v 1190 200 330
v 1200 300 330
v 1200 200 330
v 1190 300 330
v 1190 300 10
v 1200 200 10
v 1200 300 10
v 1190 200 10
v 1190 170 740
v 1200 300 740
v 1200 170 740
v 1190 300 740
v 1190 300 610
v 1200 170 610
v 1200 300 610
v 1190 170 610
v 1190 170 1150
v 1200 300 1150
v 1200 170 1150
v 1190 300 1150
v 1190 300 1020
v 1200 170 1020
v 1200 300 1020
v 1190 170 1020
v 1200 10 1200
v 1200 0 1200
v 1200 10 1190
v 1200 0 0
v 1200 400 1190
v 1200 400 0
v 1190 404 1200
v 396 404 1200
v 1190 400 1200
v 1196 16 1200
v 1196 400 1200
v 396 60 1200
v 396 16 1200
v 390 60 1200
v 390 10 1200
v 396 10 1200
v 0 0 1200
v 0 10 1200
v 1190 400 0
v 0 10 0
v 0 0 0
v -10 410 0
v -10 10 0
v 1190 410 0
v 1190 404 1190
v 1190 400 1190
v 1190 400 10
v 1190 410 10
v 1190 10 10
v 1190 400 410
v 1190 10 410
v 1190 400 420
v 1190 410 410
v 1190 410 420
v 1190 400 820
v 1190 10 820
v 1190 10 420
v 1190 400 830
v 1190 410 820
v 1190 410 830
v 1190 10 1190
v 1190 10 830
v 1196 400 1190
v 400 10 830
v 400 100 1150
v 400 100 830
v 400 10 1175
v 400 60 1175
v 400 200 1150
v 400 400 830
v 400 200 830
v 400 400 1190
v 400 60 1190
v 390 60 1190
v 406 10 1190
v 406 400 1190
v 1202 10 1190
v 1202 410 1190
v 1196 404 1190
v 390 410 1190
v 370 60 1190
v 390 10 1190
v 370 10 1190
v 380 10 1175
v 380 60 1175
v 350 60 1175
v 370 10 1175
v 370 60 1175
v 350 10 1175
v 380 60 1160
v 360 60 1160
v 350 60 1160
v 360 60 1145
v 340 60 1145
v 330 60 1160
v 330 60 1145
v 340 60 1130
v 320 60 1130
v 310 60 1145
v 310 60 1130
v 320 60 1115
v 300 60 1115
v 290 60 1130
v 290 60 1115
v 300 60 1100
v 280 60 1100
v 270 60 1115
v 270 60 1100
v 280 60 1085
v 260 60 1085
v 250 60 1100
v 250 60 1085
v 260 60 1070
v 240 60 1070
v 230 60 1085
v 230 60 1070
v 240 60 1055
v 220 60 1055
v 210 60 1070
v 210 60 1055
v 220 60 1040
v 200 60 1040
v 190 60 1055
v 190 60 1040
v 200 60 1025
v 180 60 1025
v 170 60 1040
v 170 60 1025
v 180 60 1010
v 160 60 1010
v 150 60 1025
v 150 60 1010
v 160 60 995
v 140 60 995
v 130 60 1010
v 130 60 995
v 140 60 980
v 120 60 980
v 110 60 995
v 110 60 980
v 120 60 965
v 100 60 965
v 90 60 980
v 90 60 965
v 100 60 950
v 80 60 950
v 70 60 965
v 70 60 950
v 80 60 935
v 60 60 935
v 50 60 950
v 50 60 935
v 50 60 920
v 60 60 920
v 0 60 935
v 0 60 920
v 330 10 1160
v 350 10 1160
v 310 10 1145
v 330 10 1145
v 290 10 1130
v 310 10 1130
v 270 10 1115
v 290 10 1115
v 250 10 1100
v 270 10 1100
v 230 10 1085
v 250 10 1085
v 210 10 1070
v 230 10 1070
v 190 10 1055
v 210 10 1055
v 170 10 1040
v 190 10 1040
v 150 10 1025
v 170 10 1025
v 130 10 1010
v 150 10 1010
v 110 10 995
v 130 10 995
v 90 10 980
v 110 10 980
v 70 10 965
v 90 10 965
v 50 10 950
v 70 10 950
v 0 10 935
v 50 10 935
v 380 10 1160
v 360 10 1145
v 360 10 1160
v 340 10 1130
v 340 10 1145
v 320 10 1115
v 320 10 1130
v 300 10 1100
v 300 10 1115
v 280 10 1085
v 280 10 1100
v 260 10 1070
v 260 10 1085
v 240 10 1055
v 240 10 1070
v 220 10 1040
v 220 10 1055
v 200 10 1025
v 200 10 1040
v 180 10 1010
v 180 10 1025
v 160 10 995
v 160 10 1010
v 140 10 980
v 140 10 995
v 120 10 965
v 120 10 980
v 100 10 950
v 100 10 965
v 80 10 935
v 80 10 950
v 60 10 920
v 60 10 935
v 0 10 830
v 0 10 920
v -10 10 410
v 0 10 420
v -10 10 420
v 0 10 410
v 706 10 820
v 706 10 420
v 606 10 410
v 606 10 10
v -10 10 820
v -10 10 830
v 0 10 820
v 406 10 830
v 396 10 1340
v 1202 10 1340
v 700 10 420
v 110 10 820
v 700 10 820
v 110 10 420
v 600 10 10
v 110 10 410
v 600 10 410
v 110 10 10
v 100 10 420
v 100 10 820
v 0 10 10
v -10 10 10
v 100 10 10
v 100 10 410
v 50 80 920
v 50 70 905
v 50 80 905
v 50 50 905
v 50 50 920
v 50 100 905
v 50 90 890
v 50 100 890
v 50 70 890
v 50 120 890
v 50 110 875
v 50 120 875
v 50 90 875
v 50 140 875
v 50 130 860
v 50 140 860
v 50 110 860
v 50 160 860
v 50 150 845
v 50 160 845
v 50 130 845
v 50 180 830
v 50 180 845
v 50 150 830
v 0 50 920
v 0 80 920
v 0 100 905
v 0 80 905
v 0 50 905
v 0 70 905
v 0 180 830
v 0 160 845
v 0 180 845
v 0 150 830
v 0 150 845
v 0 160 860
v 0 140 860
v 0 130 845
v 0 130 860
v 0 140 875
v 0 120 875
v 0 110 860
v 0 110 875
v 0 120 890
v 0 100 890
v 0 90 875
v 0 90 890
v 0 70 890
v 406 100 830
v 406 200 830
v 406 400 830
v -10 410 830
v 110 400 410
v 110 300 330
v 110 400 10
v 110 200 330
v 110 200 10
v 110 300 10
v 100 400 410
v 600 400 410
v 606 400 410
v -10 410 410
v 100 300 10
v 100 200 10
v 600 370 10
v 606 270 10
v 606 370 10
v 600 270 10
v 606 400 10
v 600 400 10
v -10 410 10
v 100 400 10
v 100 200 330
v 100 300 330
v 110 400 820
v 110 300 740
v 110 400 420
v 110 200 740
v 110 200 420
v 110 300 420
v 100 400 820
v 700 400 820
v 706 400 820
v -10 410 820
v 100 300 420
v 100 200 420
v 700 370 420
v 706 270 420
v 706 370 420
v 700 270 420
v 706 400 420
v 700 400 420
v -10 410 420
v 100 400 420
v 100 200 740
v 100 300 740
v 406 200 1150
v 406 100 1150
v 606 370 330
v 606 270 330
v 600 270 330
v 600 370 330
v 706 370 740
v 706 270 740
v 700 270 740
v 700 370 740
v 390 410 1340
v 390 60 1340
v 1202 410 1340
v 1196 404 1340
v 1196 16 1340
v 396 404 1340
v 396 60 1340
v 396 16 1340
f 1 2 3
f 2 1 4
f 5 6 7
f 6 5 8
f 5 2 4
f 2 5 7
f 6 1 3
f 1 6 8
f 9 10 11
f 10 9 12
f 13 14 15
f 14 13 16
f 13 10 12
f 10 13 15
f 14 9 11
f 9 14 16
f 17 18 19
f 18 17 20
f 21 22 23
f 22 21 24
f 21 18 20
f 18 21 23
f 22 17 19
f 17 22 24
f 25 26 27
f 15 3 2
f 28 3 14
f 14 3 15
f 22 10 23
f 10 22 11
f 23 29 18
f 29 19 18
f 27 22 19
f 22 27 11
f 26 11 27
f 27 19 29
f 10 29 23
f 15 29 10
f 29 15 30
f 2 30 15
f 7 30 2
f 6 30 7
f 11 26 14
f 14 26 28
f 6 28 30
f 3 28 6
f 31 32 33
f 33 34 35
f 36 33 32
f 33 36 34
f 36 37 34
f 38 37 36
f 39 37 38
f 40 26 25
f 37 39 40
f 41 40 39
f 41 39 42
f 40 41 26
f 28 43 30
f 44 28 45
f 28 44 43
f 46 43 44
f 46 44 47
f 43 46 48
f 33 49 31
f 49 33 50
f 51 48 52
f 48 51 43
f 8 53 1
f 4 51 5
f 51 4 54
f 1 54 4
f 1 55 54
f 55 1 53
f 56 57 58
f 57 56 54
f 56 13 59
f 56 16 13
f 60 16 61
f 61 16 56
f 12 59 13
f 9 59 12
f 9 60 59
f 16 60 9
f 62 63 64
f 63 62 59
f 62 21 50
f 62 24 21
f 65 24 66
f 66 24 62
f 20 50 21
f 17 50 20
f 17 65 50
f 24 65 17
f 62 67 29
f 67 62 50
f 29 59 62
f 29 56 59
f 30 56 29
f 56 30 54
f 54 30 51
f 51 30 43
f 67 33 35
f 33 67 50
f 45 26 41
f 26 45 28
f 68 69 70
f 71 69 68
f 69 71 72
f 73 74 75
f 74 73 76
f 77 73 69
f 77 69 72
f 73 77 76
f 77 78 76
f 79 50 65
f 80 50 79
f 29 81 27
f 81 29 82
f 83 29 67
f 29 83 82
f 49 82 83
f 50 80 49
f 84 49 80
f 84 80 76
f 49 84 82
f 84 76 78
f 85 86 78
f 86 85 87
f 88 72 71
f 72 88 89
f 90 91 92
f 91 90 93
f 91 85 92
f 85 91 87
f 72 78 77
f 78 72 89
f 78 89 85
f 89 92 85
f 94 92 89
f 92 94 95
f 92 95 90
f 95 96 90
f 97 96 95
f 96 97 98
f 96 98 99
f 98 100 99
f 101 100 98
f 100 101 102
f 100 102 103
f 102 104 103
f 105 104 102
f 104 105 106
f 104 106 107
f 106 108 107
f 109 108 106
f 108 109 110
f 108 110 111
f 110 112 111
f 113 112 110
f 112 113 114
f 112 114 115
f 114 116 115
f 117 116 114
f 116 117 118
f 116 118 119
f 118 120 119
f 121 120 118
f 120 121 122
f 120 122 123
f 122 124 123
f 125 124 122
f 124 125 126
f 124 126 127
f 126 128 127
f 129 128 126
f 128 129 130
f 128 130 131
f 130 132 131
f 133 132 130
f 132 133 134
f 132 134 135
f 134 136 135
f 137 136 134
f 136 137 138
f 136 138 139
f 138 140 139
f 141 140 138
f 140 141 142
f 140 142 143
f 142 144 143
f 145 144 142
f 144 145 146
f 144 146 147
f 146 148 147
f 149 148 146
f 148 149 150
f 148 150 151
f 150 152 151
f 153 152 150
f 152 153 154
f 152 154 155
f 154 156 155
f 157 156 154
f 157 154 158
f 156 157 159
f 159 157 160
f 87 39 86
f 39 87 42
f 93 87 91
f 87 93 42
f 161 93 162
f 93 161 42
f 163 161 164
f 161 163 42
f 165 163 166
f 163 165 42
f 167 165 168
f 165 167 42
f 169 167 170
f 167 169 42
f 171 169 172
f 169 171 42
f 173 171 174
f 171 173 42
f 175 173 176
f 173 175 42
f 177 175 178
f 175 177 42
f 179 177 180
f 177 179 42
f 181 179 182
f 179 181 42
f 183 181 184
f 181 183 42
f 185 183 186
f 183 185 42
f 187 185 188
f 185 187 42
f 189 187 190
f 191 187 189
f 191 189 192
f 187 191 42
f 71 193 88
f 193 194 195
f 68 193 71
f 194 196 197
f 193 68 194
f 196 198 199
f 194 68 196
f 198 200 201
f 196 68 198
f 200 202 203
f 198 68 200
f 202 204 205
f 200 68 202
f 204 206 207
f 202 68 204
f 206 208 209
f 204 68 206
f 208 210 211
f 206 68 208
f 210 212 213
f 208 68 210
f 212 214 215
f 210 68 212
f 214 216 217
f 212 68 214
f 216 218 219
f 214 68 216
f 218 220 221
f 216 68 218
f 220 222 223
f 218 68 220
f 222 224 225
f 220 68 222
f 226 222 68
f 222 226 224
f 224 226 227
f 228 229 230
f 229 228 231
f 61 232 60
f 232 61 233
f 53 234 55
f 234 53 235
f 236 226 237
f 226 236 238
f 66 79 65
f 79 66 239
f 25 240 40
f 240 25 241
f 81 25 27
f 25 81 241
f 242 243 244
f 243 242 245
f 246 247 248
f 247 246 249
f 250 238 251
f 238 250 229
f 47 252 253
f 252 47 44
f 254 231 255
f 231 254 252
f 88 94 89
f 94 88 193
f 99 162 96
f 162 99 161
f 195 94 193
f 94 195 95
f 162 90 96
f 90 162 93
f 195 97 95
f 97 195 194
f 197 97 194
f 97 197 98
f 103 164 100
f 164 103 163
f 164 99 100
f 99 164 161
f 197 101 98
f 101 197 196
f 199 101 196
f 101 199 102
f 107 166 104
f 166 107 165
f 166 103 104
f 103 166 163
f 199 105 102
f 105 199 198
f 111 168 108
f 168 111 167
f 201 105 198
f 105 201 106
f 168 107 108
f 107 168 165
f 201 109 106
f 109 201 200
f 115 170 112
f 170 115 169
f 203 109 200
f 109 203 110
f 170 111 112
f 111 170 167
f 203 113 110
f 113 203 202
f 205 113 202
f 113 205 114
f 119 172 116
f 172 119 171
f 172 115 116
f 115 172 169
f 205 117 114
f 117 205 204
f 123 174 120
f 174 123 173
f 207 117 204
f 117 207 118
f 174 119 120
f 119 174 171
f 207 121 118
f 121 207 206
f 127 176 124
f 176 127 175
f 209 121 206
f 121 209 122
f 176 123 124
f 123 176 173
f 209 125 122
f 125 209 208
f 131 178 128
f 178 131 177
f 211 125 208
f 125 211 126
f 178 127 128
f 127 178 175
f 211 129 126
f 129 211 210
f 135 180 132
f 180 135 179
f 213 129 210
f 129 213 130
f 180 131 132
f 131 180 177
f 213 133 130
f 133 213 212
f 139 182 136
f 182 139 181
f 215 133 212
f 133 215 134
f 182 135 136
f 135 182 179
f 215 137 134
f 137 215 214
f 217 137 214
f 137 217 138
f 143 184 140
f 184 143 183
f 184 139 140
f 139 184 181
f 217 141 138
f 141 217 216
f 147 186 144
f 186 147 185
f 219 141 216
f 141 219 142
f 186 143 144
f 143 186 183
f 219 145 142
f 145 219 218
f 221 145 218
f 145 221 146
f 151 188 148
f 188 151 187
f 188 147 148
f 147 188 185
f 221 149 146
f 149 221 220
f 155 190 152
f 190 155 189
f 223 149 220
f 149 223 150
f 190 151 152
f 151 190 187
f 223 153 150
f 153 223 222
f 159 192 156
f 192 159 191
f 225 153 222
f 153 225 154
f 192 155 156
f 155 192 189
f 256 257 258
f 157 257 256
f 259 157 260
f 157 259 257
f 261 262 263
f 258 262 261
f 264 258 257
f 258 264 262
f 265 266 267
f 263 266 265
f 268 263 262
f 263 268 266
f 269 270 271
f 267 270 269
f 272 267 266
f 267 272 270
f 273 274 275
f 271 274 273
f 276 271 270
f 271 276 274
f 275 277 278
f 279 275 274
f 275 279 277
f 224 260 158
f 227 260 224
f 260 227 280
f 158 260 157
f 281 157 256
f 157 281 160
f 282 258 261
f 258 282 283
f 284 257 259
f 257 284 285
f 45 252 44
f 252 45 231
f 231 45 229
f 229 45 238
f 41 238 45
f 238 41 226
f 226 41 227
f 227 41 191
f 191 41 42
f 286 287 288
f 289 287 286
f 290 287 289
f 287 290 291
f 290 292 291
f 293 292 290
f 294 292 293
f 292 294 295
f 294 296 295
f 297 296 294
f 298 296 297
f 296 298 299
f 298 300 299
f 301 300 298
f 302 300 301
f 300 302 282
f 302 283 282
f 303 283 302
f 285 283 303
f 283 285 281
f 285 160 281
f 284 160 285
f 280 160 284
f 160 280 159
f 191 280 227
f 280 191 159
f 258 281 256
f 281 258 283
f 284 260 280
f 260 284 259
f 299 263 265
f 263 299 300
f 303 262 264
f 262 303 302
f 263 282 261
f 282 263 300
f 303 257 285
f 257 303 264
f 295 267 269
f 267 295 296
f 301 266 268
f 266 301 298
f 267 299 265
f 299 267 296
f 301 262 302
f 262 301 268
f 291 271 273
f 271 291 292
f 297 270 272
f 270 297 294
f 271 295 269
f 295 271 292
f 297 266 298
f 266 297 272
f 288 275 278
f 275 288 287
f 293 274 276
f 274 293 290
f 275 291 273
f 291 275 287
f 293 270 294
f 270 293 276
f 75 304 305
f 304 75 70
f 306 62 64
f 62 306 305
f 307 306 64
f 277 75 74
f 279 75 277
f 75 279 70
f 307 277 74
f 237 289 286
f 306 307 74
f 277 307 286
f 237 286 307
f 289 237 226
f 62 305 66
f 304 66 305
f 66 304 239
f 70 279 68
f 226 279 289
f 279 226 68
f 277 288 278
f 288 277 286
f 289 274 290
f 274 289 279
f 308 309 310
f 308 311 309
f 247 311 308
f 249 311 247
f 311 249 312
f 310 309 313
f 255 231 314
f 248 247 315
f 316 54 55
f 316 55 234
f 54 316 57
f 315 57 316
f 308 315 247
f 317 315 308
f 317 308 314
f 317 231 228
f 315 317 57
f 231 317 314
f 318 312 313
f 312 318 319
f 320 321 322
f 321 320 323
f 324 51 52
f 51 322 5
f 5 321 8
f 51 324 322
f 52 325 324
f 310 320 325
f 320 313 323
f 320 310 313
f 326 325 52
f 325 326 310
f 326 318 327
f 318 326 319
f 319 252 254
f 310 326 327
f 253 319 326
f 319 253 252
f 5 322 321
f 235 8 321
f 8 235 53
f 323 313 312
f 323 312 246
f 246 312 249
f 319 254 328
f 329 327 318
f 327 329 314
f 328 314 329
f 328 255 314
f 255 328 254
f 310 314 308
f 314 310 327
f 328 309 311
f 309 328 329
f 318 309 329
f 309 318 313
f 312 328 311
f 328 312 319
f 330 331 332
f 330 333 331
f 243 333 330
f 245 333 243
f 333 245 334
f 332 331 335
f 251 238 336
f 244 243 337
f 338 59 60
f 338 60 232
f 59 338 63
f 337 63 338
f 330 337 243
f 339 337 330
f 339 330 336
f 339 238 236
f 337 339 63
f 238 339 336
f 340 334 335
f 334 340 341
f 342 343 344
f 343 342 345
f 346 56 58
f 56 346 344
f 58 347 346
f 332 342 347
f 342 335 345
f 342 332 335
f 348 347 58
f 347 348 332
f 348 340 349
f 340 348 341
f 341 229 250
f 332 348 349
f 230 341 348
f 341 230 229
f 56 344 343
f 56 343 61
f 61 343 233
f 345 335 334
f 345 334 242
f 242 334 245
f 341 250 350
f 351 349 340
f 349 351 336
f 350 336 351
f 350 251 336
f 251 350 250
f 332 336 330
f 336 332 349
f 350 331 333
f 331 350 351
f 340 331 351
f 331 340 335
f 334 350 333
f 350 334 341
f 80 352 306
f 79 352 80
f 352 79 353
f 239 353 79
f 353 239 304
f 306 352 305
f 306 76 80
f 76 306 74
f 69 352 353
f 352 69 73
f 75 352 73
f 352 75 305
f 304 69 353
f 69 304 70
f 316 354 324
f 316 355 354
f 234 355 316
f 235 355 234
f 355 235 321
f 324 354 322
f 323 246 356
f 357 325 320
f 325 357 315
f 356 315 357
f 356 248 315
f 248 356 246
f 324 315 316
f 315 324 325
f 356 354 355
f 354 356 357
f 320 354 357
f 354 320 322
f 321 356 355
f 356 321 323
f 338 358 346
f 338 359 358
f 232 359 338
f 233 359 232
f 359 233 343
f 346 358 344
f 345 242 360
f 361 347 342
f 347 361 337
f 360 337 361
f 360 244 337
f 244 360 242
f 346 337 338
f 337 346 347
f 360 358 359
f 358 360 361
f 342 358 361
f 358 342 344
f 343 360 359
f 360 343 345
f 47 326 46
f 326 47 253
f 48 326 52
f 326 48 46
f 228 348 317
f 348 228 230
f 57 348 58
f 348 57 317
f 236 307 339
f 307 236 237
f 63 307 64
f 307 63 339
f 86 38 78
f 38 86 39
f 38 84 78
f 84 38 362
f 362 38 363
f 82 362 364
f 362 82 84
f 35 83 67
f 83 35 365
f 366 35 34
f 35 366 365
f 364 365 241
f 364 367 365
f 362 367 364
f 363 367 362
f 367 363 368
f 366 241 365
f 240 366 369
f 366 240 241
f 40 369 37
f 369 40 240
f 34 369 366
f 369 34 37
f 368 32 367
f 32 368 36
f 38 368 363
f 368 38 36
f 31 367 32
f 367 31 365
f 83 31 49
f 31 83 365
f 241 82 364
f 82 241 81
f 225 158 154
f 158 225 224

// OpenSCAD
module door() {
    cube([30,100,320]);
}

module window() {
    cube([30,130,130]);
}
// Fond 1m20 x 1m20 x 1cm
cube([1200,10,1200]);
// Mur Gauche 1m20 x 40cm x 1cm
// devant le fond
difference() {
    translate([1190,0,0]) {
      cube([10,400,1200]);
    }
    union() {
        // Porte 32cm x 10cm 
        // située à 10cm du devant et à 1cm du sol
        translate([1189,200,10]) door();
        // Fenêtre
        translate([1189,170,610]) window();
        // Fenêtre
        translate([1189,170,1020]) window();
    }
}
// Rez de chaussée 1m20 x 40cm x 1cm
// positionné devant le fond (dépasse d'1cm à droite)
translate([-10,10,0]) {
  cube([1200,400,10]);
}
// 1er étage 1m20 x 40cm x 1cm
// positionné devant le fond (dépasse d'1cm à droite)
// à 40cm au-dessus du RdC (à 41cm du bas du fond)
translate([-10,10,410]) {
  cube([1200,400,10]);
}
// 2ème étage 1m20 x 40cm x 1cm
// positionné devant le fond (dépasse d'1cm à droite)
// à 40cm au-dessus du 1er (à 82cm du bas du fond)
translate([-10,10,820]) {
  cube([1200,400,10]);
}
// Terrasse 80cm x 40cm x 1cm
// positionnée devant le fond, collée au mur de gauche
// à 1m19 du bas du fond
translate([390,10,1190]) {
  cube([800,400,10]);
}
// Parapet 15cm de haut
translate([396,10,1190]) {
  cube([800,6,150]);
}
translate([390,60,1190]) {
  cube([6,350,150]);
}
translate([396,404,1190]) {
  cube([800,6,150]);
}
translate([1196,10,1190]) {
  cube([6,400,150]);
}
// Escalier Terrasse
for (i=[0:16])
    translate([370 - 20*i,10,1175 - 15*i]) {
        cube([30,50,15]);
    }
translate([0,10,920]) {
    cube([60,50,15]);
}
for (i=[0:5])
    translate([0,50 + 20*i,905 - 15*i]) {
        cube([50,30,15]);
    }

// Mur de droite Rez de chaussée 40cm x 40cm x 1cm
difference() {
    translate([100,0,10]) {
      cube([10,400,400]);
    }
    translate([90,200,10]) door();
}
// Mur de droite 1er étage 40cm x 40cm x 1cm
difference() {
    translate([100,0,420]) {
      cube([10,400,400]);
    }   
    translate([90,200,420]) door();
}
// Mur de droite 2eme étage 40cm x 36cm x 1cm
difference() {
    translate([400,0,830]) {
      cube([6,400,360]);
    }
    translate([394,100,830]) door();
}
// Cloison Rez de chaussée 40cm x 40cm x 6mm
difference() {
    translate([600,0,10]) {
      cube([6,400,400]);
    }
    translate([594,270,10]) door();
}
// Cloison 1er étage 40cm x 40cm x 6mm
difference() {
    translate([700,0,420]) {
        cube([6,400,400]);
    }
    translate([694,270,420]) door();
}
